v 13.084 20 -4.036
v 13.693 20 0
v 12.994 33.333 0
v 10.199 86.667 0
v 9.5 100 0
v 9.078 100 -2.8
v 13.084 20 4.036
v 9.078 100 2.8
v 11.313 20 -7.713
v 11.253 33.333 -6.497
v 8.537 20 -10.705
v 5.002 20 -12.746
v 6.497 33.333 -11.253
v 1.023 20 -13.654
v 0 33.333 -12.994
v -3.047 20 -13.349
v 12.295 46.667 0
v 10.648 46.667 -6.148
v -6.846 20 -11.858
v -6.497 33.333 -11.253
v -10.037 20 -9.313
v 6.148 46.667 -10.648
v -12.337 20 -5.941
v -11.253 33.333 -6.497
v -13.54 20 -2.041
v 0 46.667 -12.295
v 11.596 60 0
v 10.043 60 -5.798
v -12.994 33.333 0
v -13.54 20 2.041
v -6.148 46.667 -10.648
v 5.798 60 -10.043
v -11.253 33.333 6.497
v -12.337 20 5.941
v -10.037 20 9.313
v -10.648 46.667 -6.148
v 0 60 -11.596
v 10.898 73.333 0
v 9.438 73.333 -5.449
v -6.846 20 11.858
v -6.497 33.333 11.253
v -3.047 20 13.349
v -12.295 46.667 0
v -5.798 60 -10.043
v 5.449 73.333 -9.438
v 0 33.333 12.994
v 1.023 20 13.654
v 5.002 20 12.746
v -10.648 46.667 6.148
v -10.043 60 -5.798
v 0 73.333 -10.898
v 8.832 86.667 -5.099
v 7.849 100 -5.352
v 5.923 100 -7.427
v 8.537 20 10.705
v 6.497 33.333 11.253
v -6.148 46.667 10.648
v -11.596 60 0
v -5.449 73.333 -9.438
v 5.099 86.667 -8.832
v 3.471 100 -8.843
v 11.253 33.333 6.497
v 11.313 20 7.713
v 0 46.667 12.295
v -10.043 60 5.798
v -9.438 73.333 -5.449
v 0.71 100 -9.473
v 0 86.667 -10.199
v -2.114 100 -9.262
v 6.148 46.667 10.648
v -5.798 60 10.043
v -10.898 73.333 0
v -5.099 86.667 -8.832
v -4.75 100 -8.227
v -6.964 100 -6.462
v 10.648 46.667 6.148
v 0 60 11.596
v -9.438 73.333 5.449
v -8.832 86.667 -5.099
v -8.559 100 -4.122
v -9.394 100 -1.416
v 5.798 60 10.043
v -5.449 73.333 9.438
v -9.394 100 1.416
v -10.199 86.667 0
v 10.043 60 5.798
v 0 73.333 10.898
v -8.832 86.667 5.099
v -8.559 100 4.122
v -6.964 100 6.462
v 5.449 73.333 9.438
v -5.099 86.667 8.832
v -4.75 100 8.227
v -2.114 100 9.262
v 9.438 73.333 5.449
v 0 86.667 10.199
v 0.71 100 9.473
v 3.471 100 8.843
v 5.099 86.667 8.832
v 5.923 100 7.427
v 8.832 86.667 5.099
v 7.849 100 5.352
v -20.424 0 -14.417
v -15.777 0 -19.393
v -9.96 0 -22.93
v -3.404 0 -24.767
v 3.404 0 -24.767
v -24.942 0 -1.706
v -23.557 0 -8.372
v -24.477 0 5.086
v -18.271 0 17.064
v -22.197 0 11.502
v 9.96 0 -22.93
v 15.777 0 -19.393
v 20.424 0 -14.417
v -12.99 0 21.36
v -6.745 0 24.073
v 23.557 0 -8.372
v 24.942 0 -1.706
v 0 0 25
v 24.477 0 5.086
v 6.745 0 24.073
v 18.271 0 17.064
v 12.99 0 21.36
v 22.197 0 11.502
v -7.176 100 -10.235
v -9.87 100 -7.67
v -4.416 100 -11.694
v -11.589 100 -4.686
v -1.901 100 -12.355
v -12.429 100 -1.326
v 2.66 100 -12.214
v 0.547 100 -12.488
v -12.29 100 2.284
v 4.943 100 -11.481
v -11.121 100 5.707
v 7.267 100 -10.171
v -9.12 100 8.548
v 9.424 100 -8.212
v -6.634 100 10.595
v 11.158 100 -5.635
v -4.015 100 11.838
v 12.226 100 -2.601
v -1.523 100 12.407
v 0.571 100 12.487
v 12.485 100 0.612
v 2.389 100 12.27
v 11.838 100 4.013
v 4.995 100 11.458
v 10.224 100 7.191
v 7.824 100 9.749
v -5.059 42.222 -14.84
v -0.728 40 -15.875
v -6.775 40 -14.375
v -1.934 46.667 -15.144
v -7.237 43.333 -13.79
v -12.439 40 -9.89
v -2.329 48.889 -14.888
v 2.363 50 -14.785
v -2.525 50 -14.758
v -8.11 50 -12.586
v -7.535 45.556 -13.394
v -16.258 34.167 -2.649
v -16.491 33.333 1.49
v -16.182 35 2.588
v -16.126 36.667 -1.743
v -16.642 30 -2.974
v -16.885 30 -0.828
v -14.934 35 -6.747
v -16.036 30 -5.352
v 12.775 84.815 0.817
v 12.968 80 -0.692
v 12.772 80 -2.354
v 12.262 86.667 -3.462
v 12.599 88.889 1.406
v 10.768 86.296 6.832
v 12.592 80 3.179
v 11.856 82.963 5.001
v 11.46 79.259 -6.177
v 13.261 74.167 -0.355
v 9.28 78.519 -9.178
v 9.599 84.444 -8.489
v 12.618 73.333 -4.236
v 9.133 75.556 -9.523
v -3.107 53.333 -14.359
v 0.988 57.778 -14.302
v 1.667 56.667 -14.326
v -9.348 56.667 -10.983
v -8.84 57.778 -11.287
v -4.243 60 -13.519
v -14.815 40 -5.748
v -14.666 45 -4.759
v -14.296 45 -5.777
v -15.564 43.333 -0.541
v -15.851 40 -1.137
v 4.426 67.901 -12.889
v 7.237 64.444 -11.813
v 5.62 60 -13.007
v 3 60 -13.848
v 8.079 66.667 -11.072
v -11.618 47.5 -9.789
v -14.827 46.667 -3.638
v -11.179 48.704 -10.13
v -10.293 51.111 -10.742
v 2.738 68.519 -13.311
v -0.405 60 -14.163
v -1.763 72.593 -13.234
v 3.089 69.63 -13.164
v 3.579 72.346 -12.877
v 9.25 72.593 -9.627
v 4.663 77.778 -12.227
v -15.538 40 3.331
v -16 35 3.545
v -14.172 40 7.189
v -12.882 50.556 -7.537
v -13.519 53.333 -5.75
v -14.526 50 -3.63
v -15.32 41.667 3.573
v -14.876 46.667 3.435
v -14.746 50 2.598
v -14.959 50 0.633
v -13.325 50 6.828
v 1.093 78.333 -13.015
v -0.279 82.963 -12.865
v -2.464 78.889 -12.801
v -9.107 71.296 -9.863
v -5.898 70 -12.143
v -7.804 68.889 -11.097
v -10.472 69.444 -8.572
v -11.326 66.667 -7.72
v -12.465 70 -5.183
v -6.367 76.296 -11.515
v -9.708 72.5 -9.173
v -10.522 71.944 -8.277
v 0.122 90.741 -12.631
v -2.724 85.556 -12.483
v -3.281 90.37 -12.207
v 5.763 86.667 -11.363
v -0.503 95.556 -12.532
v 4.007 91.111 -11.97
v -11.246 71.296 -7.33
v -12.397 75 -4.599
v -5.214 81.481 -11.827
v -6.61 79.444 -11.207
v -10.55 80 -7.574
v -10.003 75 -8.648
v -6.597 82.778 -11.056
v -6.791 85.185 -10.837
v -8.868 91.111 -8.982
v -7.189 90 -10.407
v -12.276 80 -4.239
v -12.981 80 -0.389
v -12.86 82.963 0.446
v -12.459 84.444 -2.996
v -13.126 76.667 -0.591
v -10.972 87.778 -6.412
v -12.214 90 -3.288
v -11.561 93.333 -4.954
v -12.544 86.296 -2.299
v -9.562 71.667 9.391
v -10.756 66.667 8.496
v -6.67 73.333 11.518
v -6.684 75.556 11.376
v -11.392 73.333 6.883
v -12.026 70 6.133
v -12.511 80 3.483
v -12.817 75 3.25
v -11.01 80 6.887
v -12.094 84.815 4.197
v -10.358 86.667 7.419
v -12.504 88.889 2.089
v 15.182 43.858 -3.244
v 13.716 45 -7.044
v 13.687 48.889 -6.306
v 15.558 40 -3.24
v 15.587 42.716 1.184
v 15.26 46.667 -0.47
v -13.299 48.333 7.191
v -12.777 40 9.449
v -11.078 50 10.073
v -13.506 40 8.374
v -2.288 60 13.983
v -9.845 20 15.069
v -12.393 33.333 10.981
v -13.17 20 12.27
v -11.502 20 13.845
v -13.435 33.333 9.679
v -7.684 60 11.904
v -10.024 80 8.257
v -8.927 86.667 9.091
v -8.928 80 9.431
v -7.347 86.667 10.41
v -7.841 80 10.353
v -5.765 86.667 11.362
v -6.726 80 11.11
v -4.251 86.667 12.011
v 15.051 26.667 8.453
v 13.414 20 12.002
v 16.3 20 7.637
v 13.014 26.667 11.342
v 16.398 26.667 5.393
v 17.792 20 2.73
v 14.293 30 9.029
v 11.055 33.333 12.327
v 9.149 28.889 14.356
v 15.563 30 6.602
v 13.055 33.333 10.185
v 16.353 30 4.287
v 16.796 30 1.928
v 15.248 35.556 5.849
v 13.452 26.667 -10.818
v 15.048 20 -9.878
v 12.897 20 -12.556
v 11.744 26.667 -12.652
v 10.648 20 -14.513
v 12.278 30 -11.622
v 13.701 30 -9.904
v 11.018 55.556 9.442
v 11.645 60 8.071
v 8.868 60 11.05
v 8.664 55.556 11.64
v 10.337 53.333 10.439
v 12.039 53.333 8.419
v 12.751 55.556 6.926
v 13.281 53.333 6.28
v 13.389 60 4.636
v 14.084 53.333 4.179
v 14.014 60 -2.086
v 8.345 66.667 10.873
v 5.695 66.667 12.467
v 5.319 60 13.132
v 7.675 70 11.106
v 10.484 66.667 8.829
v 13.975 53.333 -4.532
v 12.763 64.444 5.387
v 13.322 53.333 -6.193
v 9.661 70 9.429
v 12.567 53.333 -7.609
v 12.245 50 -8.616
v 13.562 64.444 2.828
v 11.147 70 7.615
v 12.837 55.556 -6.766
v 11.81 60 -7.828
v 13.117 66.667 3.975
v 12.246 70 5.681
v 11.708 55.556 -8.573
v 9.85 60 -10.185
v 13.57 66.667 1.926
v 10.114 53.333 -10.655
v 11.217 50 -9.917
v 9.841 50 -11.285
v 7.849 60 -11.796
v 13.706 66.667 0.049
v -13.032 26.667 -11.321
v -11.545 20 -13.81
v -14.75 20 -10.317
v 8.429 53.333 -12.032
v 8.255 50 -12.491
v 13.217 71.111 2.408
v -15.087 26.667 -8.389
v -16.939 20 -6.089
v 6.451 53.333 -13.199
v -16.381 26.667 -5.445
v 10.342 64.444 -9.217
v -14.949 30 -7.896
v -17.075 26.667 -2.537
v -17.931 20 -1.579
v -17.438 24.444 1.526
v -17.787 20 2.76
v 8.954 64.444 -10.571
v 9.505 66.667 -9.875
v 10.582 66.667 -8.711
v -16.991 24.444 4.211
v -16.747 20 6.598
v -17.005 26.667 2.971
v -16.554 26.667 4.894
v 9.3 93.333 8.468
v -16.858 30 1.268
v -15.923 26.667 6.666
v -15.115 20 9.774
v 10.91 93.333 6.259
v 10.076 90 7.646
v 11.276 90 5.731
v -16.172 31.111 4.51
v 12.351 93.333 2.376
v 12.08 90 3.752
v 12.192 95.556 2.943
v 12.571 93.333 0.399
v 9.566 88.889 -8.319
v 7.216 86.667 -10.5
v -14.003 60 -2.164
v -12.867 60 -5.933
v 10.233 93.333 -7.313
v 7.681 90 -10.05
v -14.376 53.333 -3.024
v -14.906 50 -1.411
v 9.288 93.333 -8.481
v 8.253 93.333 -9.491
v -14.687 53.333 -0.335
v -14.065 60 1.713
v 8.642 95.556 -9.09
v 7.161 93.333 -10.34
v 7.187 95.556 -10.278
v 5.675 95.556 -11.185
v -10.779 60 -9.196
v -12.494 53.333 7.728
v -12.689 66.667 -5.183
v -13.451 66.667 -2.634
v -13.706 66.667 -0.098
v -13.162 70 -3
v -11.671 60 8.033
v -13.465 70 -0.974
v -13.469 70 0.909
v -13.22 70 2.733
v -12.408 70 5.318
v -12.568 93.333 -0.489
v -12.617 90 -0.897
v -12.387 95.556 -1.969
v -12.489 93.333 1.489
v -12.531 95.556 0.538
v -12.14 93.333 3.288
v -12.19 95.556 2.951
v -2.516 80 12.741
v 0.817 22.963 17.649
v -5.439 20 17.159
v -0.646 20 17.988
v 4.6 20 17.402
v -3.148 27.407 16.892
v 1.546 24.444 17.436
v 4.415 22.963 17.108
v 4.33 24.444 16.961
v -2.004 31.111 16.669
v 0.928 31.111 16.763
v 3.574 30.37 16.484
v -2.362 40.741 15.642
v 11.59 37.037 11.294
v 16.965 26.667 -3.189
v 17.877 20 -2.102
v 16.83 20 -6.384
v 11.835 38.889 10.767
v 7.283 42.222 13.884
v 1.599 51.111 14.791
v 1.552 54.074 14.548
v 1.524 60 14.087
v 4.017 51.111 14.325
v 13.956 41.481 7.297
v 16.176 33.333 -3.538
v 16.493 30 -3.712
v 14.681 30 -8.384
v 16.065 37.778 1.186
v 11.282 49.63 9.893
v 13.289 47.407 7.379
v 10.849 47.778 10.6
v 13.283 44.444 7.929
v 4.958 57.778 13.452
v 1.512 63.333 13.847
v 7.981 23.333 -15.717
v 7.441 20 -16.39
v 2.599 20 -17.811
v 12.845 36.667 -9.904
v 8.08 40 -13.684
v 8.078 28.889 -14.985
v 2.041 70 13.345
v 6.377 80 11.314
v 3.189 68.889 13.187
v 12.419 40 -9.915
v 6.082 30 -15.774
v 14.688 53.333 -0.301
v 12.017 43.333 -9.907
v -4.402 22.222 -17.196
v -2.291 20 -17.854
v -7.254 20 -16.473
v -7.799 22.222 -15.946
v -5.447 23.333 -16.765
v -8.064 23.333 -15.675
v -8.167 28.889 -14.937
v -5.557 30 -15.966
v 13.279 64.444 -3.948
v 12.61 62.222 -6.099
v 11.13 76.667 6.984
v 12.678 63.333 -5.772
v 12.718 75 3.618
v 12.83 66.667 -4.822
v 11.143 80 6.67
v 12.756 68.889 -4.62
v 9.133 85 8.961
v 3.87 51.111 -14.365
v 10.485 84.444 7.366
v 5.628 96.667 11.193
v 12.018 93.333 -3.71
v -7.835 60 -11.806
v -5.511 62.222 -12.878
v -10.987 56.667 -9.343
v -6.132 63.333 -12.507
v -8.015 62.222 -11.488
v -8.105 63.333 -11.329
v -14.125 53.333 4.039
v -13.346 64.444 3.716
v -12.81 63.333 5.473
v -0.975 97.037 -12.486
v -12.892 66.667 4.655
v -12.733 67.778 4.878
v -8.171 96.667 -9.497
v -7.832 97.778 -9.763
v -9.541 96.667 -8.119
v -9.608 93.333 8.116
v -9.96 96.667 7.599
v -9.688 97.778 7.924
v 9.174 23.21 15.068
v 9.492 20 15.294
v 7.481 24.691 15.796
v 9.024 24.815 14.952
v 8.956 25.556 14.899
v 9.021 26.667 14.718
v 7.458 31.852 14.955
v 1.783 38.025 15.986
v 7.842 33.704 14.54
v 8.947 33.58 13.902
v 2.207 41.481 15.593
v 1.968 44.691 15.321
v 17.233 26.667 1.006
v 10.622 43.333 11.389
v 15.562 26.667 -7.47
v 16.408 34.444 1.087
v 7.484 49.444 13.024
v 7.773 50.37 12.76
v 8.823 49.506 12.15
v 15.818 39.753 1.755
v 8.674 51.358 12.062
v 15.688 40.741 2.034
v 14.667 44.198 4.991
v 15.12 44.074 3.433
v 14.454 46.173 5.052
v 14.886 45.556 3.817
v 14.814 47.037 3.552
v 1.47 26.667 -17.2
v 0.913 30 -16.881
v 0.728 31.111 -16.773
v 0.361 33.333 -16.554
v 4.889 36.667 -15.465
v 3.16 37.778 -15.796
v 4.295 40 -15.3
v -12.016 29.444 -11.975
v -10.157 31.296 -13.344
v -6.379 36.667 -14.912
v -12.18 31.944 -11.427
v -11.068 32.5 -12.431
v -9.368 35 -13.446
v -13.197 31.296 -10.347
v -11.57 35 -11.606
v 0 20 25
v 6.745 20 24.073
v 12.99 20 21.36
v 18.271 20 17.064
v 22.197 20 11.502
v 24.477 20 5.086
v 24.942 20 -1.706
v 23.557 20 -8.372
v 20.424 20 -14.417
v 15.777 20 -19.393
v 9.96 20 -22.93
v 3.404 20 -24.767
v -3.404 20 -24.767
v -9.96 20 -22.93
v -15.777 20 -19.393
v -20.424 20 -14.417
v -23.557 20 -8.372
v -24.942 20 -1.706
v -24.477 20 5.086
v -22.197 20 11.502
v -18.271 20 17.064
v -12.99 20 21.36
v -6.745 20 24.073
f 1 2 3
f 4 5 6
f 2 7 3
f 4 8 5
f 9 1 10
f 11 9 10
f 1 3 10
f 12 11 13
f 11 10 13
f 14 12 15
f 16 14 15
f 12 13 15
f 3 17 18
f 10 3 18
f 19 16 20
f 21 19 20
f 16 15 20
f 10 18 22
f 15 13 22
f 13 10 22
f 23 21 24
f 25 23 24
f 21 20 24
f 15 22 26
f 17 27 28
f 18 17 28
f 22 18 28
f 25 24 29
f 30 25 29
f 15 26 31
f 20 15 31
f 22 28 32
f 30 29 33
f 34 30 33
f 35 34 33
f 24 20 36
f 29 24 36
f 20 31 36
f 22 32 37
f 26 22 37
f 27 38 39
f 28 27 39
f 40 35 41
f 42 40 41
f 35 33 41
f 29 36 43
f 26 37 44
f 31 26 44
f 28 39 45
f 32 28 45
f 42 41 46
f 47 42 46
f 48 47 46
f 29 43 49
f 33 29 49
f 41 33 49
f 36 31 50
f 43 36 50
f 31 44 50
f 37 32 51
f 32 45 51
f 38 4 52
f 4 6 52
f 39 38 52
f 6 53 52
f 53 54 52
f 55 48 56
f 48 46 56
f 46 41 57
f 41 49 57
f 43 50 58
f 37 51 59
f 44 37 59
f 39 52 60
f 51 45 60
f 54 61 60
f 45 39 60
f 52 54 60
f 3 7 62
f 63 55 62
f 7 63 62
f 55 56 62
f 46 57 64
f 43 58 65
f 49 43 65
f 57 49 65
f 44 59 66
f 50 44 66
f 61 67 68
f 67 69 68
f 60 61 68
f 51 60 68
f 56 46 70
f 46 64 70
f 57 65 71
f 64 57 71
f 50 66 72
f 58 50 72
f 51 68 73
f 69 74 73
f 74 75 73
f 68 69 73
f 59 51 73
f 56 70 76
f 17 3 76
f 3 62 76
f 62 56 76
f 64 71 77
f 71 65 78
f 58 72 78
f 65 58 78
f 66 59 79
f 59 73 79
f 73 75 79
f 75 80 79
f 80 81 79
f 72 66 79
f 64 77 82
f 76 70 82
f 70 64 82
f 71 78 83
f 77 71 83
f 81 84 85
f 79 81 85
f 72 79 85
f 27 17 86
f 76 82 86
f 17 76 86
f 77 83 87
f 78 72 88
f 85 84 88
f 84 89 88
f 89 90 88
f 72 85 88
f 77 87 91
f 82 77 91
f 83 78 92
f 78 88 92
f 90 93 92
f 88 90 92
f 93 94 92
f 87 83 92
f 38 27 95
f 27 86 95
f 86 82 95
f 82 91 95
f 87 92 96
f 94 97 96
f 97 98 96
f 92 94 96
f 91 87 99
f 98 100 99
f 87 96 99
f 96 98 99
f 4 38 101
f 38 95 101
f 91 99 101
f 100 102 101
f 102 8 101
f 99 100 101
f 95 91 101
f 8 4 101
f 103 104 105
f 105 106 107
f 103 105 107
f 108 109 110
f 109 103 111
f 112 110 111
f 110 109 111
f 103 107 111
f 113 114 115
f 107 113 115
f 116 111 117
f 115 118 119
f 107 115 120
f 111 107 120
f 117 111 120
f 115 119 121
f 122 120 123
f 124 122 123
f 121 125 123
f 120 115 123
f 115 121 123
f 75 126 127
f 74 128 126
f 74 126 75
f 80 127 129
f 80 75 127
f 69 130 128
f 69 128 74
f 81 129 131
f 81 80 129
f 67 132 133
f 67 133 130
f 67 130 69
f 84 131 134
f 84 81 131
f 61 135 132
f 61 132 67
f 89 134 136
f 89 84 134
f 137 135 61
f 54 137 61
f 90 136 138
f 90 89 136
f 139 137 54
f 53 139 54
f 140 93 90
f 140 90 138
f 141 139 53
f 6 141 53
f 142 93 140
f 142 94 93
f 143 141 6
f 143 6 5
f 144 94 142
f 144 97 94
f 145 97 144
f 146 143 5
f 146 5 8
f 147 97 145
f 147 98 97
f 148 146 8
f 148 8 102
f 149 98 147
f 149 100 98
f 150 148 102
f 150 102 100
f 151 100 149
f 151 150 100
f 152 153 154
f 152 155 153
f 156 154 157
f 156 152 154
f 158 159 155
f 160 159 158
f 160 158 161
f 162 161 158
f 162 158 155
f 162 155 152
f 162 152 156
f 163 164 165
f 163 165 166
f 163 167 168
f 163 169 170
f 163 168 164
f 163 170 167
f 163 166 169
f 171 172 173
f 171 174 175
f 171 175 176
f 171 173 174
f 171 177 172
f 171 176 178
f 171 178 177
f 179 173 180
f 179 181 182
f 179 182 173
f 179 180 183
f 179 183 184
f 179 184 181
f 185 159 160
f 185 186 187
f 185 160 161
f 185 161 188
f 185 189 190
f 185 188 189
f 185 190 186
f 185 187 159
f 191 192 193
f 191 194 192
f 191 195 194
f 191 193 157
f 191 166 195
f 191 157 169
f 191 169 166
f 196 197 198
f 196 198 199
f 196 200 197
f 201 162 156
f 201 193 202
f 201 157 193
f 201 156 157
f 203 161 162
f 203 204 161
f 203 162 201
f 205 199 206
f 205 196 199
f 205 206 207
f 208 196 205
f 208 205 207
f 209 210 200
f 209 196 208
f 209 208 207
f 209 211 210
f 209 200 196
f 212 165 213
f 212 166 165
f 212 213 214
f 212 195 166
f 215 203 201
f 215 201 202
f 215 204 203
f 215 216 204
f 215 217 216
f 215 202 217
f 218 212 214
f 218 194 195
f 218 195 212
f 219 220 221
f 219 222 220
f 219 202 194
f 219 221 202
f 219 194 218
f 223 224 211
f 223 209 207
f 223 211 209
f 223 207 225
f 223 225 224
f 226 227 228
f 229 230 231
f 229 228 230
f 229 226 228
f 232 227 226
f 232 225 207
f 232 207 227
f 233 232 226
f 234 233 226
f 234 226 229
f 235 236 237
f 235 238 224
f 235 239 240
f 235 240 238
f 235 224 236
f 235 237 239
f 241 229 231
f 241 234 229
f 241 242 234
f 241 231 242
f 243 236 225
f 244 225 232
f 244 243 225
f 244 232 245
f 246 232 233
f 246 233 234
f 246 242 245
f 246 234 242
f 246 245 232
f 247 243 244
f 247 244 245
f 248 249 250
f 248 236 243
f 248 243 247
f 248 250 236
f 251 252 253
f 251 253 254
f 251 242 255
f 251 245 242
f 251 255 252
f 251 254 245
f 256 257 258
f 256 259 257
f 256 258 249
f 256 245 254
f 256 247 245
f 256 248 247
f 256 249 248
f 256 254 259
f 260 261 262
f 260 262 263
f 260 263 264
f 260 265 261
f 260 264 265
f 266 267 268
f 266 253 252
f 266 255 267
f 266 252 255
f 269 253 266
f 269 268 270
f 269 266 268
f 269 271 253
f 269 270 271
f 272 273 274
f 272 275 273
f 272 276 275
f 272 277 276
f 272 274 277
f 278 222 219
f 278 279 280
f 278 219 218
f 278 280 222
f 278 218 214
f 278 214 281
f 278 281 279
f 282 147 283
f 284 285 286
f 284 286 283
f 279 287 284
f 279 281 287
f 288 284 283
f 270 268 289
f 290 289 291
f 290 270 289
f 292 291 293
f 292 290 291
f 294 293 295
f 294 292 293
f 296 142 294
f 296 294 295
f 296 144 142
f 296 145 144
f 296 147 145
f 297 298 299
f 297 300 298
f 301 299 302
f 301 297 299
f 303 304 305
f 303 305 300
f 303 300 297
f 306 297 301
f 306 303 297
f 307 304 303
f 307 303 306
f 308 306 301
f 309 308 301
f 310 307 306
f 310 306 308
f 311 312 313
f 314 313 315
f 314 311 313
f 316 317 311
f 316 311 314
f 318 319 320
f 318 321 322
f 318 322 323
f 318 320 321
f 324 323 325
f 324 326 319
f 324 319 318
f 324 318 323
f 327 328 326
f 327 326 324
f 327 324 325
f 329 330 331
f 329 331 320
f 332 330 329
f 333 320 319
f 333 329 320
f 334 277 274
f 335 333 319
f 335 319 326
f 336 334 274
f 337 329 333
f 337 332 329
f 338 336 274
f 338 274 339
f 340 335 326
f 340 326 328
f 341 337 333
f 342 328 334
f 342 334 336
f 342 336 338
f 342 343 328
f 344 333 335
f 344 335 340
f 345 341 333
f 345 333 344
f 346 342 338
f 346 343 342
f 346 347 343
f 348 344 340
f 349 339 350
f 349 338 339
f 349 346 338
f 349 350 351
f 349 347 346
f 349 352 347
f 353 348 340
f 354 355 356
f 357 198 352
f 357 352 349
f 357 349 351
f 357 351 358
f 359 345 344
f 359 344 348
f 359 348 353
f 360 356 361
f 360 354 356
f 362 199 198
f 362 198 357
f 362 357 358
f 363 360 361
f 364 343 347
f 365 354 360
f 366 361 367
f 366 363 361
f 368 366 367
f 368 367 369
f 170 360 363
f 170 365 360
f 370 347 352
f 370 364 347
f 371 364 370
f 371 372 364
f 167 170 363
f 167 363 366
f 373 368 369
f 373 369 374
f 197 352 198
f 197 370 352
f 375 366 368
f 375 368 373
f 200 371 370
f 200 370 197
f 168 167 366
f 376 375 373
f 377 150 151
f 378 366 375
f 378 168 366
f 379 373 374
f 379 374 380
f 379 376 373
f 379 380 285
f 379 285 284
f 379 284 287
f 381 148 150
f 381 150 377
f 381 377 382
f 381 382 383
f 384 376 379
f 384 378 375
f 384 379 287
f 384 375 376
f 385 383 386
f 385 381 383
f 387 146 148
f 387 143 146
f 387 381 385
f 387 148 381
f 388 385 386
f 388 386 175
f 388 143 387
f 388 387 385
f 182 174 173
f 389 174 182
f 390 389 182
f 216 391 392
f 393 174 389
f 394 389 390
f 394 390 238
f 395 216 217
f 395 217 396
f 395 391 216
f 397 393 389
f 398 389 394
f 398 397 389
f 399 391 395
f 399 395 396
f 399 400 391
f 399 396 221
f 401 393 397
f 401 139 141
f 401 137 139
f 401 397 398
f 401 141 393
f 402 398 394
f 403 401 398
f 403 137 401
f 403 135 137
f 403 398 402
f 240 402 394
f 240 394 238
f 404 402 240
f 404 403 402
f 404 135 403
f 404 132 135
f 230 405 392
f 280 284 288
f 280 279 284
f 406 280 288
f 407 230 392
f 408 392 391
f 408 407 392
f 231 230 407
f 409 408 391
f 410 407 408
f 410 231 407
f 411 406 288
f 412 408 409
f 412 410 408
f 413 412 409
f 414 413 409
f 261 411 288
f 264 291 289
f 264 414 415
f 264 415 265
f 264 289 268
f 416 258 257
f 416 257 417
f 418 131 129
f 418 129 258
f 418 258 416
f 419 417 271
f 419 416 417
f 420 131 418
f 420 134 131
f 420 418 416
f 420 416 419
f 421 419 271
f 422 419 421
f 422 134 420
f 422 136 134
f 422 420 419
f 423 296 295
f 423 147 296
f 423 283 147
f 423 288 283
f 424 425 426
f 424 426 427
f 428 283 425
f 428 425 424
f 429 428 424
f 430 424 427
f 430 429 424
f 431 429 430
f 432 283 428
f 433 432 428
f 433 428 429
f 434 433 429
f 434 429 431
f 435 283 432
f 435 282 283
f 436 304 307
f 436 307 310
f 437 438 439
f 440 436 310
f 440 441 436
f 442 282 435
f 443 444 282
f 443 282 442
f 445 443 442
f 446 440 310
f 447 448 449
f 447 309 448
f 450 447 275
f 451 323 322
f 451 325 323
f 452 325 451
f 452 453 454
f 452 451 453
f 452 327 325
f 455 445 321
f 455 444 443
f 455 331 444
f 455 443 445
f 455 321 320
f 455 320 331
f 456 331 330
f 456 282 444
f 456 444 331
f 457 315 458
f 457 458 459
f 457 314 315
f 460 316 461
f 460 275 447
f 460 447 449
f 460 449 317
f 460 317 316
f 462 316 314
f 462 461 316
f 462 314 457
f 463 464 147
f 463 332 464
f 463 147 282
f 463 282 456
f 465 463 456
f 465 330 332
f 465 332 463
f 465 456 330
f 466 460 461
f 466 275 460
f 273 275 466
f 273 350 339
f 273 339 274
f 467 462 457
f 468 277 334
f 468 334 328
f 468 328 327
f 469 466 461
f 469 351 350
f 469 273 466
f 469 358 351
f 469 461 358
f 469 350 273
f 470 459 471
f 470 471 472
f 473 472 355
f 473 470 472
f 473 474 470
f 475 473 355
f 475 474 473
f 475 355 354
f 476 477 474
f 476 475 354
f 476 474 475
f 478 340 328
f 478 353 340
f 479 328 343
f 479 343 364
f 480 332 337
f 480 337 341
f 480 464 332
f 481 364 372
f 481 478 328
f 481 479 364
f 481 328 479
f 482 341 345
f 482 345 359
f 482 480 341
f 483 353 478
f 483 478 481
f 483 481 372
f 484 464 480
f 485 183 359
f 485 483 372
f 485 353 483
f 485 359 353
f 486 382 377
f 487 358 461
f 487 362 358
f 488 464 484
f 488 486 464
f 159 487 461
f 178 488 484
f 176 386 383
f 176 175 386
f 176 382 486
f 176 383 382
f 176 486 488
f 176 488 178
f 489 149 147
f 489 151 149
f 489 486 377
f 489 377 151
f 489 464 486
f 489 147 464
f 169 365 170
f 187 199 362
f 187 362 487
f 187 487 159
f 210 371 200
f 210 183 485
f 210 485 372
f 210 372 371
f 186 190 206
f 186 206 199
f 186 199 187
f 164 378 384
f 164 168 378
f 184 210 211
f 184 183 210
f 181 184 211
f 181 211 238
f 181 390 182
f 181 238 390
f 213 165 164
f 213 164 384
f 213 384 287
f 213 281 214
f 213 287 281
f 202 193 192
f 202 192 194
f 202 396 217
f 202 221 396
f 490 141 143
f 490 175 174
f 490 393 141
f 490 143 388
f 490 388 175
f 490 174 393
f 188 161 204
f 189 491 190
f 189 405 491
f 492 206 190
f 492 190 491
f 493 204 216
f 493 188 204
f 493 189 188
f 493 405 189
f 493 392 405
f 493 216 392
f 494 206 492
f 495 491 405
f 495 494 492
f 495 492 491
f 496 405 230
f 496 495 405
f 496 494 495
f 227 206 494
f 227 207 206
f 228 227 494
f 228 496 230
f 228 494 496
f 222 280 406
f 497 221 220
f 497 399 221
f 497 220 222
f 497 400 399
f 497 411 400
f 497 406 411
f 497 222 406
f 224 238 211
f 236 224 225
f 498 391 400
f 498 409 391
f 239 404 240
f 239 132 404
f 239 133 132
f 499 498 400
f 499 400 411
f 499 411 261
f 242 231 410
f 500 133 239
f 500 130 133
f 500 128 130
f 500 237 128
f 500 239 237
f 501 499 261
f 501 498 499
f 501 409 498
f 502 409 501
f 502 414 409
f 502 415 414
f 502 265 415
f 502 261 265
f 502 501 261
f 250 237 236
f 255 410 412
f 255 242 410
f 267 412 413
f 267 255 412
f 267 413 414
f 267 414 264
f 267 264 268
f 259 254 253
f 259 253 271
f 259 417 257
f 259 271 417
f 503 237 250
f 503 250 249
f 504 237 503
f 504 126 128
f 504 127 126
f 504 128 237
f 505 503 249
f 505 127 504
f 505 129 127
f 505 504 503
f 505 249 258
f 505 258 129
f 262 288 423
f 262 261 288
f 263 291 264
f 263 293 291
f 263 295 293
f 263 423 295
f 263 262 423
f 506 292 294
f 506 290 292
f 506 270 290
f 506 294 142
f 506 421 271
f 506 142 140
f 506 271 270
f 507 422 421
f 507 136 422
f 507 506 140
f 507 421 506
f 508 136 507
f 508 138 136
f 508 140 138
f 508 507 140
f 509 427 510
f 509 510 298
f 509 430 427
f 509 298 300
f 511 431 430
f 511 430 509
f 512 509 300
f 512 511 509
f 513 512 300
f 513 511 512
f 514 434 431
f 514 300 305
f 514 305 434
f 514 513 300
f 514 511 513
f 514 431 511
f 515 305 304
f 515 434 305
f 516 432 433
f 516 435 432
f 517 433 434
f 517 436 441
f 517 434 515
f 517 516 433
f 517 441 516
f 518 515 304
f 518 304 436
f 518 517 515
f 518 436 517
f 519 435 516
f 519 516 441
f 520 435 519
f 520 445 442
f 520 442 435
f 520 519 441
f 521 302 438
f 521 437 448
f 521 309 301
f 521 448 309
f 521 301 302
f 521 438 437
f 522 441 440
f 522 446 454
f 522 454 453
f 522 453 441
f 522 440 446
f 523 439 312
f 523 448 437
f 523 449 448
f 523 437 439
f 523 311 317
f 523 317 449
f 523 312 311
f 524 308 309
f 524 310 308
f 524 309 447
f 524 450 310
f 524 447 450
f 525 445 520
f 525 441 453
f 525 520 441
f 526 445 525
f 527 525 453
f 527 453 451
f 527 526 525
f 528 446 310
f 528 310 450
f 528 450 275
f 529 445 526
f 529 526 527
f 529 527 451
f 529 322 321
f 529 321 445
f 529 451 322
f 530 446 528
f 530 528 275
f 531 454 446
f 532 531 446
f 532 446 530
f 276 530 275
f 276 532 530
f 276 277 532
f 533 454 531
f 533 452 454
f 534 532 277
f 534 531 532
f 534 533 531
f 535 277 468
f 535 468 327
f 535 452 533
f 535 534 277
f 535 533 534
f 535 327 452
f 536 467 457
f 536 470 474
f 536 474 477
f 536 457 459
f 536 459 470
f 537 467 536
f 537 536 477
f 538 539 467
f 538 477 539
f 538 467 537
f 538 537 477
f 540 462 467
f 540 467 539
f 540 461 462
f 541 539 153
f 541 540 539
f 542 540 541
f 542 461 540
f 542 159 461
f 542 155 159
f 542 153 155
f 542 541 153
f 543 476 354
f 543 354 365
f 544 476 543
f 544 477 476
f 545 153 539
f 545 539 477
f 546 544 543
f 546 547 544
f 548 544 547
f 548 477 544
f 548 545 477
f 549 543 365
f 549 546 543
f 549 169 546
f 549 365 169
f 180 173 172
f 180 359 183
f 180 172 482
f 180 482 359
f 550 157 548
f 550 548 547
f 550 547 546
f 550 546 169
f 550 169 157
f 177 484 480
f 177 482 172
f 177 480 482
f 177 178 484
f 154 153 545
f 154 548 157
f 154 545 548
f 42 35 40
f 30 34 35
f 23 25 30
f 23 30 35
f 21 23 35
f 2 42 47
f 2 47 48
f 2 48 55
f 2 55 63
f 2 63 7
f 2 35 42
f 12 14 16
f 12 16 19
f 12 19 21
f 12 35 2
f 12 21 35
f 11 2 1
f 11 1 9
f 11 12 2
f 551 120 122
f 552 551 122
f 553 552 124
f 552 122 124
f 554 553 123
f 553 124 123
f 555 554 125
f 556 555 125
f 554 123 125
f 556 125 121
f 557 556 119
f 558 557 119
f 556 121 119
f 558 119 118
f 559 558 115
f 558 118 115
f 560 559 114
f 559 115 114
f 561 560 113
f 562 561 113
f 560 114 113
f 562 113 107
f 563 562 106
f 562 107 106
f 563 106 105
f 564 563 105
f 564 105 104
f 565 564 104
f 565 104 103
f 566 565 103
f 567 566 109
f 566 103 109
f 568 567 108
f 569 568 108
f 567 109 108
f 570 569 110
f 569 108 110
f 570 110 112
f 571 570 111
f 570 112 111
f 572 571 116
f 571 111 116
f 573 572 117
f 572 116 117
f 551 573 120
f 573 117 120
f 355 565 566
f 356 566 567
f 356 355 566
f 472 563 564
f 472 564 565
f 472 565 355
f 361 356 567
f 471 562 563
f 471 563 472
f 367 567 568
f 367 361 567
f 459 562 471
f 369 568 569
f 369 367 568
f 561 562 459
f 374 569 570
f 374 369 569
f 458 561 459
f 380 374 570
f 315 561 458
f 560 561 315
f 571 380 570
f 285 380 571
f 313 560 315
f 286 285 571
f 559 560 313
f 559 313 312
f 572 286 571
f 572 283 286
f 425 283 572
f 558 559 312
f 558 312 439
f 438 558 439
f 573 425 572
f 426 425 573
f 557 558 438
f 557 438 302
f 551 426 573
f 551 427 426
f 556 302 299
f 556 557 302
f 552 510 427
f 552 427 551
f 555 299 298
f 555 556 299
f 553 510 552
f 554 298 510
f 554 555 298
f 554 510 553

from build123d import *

# Parameters (mm, degrees)
CROQUIS1_R              = 25
SALIENTE_EXTRUIR1_DEPTH = 20
CROQUIS5_R              = 9.5
CORTAR_EXTRUIR1_DEPTH   = 80
CORTAR_EXTRUIR1_DRAFT   = 3


with BuildPart() as part:
    # Croquis1 → Saliente-Extruir1 (new body)
    with BuildSketch(Plane(origin=(0, 0, 0), x_dir=(1, 0, 0), z_dir=(0, 1, 0))):
        with Locations(Location((0, 0, 0), (0, 0, 270))):
            Circle(CROQUIS1_R)
    extrude(amount=SALIENTE_EXTRUIR1_DEPTH)

    # Recubrir1: read off the stored shape, not the designer's step
    # Recubrir1: loft between two sections, ruled curve by curve
    recubrir1_from = [
        Edge.make_bspline([(-9.844568518, 20, 15.069322171), (20.294075824, 20, 34.758459207), (39.98321286, 20, 4.619814865), (9.844568518, 20, -15.069322171), (-20.294075824, 20, -34.758459207), (-39.98321286, 20, -4.619814865), (-9.844568518, 20, 15.069322171)], [0, 0, 0, 0, 0.5, 0.5, 0.5, 1, 1, 1, 1], 3, [1, 0.333333333, 0.333333333, 1, 0.333333333, 0.333333333, 1]),
    ]
    recubrir1_to = [
        Edge.make_bspline([(2.388538874, 100, 12.269673266), (26.927885406, 100, 7.492595517), (22.150807657, 100, -17.046751015), (-2.388538874, 100, -12.269673266), (-26.927885406, 100, -7.492595517), (-22.150807657, 100, 17.046751015), (2.388538874, 100, 12.269673266)], [0, 0, 0, 0, 0.5, 0.5, 0.5, 1, 1, 1, 1], 3, [1, 0.333333333, 0.333333333, 1, 0.333333333, 0.333333333, 1]),
    ]
    recubrir1 = Solid(Shell([*[Face.make_surface_from_curves(recubrir1_from[k], recubrir1_to[k]) for k in range(1)], Face(Wire(recubrir1_from)), Face(Wire(recubrir1_to))]))
    add(recubrir1)


with BuildPart() as cortar_extruir1_tool:
    # Croquis5 → Cortar-Extruir1 (with draft: the straight prism first)
    with BuildSketch(Plane(origin=(0, 100, 0), x_dir=(1, 0, 0), z_dir=(0, 1, 0))):
        Circle(CROQUIS5_R)
    extrude(amount=-CORTAR_EXTRUIR1_DEPTH)
    # Cortar-Extruir1: the draft: its side faces are tilted about the plane it starts from
    cortar_extruir1_sides = [cortar_extruir1_tool.faces().sort_by_distance(p)[0] for p in [
        (-9.5, 60, 0),
    ]]
    draft(cortar_extruir1_sides, Plane(origin=(0, 100, 0), x_dir=(1, 0, 0), z_dir=(0, 1, 0)), CORTAR_EXTRUIR1_DRAFT)


with BuildPart() as part_1:
    add(part.part)

    # Cortar-Extruir1: cut by cortar_extruir1_tool
    add(cortar_extruir1_tool.part, mode=Mode.SUBTRACT)


solid = part_1.part
